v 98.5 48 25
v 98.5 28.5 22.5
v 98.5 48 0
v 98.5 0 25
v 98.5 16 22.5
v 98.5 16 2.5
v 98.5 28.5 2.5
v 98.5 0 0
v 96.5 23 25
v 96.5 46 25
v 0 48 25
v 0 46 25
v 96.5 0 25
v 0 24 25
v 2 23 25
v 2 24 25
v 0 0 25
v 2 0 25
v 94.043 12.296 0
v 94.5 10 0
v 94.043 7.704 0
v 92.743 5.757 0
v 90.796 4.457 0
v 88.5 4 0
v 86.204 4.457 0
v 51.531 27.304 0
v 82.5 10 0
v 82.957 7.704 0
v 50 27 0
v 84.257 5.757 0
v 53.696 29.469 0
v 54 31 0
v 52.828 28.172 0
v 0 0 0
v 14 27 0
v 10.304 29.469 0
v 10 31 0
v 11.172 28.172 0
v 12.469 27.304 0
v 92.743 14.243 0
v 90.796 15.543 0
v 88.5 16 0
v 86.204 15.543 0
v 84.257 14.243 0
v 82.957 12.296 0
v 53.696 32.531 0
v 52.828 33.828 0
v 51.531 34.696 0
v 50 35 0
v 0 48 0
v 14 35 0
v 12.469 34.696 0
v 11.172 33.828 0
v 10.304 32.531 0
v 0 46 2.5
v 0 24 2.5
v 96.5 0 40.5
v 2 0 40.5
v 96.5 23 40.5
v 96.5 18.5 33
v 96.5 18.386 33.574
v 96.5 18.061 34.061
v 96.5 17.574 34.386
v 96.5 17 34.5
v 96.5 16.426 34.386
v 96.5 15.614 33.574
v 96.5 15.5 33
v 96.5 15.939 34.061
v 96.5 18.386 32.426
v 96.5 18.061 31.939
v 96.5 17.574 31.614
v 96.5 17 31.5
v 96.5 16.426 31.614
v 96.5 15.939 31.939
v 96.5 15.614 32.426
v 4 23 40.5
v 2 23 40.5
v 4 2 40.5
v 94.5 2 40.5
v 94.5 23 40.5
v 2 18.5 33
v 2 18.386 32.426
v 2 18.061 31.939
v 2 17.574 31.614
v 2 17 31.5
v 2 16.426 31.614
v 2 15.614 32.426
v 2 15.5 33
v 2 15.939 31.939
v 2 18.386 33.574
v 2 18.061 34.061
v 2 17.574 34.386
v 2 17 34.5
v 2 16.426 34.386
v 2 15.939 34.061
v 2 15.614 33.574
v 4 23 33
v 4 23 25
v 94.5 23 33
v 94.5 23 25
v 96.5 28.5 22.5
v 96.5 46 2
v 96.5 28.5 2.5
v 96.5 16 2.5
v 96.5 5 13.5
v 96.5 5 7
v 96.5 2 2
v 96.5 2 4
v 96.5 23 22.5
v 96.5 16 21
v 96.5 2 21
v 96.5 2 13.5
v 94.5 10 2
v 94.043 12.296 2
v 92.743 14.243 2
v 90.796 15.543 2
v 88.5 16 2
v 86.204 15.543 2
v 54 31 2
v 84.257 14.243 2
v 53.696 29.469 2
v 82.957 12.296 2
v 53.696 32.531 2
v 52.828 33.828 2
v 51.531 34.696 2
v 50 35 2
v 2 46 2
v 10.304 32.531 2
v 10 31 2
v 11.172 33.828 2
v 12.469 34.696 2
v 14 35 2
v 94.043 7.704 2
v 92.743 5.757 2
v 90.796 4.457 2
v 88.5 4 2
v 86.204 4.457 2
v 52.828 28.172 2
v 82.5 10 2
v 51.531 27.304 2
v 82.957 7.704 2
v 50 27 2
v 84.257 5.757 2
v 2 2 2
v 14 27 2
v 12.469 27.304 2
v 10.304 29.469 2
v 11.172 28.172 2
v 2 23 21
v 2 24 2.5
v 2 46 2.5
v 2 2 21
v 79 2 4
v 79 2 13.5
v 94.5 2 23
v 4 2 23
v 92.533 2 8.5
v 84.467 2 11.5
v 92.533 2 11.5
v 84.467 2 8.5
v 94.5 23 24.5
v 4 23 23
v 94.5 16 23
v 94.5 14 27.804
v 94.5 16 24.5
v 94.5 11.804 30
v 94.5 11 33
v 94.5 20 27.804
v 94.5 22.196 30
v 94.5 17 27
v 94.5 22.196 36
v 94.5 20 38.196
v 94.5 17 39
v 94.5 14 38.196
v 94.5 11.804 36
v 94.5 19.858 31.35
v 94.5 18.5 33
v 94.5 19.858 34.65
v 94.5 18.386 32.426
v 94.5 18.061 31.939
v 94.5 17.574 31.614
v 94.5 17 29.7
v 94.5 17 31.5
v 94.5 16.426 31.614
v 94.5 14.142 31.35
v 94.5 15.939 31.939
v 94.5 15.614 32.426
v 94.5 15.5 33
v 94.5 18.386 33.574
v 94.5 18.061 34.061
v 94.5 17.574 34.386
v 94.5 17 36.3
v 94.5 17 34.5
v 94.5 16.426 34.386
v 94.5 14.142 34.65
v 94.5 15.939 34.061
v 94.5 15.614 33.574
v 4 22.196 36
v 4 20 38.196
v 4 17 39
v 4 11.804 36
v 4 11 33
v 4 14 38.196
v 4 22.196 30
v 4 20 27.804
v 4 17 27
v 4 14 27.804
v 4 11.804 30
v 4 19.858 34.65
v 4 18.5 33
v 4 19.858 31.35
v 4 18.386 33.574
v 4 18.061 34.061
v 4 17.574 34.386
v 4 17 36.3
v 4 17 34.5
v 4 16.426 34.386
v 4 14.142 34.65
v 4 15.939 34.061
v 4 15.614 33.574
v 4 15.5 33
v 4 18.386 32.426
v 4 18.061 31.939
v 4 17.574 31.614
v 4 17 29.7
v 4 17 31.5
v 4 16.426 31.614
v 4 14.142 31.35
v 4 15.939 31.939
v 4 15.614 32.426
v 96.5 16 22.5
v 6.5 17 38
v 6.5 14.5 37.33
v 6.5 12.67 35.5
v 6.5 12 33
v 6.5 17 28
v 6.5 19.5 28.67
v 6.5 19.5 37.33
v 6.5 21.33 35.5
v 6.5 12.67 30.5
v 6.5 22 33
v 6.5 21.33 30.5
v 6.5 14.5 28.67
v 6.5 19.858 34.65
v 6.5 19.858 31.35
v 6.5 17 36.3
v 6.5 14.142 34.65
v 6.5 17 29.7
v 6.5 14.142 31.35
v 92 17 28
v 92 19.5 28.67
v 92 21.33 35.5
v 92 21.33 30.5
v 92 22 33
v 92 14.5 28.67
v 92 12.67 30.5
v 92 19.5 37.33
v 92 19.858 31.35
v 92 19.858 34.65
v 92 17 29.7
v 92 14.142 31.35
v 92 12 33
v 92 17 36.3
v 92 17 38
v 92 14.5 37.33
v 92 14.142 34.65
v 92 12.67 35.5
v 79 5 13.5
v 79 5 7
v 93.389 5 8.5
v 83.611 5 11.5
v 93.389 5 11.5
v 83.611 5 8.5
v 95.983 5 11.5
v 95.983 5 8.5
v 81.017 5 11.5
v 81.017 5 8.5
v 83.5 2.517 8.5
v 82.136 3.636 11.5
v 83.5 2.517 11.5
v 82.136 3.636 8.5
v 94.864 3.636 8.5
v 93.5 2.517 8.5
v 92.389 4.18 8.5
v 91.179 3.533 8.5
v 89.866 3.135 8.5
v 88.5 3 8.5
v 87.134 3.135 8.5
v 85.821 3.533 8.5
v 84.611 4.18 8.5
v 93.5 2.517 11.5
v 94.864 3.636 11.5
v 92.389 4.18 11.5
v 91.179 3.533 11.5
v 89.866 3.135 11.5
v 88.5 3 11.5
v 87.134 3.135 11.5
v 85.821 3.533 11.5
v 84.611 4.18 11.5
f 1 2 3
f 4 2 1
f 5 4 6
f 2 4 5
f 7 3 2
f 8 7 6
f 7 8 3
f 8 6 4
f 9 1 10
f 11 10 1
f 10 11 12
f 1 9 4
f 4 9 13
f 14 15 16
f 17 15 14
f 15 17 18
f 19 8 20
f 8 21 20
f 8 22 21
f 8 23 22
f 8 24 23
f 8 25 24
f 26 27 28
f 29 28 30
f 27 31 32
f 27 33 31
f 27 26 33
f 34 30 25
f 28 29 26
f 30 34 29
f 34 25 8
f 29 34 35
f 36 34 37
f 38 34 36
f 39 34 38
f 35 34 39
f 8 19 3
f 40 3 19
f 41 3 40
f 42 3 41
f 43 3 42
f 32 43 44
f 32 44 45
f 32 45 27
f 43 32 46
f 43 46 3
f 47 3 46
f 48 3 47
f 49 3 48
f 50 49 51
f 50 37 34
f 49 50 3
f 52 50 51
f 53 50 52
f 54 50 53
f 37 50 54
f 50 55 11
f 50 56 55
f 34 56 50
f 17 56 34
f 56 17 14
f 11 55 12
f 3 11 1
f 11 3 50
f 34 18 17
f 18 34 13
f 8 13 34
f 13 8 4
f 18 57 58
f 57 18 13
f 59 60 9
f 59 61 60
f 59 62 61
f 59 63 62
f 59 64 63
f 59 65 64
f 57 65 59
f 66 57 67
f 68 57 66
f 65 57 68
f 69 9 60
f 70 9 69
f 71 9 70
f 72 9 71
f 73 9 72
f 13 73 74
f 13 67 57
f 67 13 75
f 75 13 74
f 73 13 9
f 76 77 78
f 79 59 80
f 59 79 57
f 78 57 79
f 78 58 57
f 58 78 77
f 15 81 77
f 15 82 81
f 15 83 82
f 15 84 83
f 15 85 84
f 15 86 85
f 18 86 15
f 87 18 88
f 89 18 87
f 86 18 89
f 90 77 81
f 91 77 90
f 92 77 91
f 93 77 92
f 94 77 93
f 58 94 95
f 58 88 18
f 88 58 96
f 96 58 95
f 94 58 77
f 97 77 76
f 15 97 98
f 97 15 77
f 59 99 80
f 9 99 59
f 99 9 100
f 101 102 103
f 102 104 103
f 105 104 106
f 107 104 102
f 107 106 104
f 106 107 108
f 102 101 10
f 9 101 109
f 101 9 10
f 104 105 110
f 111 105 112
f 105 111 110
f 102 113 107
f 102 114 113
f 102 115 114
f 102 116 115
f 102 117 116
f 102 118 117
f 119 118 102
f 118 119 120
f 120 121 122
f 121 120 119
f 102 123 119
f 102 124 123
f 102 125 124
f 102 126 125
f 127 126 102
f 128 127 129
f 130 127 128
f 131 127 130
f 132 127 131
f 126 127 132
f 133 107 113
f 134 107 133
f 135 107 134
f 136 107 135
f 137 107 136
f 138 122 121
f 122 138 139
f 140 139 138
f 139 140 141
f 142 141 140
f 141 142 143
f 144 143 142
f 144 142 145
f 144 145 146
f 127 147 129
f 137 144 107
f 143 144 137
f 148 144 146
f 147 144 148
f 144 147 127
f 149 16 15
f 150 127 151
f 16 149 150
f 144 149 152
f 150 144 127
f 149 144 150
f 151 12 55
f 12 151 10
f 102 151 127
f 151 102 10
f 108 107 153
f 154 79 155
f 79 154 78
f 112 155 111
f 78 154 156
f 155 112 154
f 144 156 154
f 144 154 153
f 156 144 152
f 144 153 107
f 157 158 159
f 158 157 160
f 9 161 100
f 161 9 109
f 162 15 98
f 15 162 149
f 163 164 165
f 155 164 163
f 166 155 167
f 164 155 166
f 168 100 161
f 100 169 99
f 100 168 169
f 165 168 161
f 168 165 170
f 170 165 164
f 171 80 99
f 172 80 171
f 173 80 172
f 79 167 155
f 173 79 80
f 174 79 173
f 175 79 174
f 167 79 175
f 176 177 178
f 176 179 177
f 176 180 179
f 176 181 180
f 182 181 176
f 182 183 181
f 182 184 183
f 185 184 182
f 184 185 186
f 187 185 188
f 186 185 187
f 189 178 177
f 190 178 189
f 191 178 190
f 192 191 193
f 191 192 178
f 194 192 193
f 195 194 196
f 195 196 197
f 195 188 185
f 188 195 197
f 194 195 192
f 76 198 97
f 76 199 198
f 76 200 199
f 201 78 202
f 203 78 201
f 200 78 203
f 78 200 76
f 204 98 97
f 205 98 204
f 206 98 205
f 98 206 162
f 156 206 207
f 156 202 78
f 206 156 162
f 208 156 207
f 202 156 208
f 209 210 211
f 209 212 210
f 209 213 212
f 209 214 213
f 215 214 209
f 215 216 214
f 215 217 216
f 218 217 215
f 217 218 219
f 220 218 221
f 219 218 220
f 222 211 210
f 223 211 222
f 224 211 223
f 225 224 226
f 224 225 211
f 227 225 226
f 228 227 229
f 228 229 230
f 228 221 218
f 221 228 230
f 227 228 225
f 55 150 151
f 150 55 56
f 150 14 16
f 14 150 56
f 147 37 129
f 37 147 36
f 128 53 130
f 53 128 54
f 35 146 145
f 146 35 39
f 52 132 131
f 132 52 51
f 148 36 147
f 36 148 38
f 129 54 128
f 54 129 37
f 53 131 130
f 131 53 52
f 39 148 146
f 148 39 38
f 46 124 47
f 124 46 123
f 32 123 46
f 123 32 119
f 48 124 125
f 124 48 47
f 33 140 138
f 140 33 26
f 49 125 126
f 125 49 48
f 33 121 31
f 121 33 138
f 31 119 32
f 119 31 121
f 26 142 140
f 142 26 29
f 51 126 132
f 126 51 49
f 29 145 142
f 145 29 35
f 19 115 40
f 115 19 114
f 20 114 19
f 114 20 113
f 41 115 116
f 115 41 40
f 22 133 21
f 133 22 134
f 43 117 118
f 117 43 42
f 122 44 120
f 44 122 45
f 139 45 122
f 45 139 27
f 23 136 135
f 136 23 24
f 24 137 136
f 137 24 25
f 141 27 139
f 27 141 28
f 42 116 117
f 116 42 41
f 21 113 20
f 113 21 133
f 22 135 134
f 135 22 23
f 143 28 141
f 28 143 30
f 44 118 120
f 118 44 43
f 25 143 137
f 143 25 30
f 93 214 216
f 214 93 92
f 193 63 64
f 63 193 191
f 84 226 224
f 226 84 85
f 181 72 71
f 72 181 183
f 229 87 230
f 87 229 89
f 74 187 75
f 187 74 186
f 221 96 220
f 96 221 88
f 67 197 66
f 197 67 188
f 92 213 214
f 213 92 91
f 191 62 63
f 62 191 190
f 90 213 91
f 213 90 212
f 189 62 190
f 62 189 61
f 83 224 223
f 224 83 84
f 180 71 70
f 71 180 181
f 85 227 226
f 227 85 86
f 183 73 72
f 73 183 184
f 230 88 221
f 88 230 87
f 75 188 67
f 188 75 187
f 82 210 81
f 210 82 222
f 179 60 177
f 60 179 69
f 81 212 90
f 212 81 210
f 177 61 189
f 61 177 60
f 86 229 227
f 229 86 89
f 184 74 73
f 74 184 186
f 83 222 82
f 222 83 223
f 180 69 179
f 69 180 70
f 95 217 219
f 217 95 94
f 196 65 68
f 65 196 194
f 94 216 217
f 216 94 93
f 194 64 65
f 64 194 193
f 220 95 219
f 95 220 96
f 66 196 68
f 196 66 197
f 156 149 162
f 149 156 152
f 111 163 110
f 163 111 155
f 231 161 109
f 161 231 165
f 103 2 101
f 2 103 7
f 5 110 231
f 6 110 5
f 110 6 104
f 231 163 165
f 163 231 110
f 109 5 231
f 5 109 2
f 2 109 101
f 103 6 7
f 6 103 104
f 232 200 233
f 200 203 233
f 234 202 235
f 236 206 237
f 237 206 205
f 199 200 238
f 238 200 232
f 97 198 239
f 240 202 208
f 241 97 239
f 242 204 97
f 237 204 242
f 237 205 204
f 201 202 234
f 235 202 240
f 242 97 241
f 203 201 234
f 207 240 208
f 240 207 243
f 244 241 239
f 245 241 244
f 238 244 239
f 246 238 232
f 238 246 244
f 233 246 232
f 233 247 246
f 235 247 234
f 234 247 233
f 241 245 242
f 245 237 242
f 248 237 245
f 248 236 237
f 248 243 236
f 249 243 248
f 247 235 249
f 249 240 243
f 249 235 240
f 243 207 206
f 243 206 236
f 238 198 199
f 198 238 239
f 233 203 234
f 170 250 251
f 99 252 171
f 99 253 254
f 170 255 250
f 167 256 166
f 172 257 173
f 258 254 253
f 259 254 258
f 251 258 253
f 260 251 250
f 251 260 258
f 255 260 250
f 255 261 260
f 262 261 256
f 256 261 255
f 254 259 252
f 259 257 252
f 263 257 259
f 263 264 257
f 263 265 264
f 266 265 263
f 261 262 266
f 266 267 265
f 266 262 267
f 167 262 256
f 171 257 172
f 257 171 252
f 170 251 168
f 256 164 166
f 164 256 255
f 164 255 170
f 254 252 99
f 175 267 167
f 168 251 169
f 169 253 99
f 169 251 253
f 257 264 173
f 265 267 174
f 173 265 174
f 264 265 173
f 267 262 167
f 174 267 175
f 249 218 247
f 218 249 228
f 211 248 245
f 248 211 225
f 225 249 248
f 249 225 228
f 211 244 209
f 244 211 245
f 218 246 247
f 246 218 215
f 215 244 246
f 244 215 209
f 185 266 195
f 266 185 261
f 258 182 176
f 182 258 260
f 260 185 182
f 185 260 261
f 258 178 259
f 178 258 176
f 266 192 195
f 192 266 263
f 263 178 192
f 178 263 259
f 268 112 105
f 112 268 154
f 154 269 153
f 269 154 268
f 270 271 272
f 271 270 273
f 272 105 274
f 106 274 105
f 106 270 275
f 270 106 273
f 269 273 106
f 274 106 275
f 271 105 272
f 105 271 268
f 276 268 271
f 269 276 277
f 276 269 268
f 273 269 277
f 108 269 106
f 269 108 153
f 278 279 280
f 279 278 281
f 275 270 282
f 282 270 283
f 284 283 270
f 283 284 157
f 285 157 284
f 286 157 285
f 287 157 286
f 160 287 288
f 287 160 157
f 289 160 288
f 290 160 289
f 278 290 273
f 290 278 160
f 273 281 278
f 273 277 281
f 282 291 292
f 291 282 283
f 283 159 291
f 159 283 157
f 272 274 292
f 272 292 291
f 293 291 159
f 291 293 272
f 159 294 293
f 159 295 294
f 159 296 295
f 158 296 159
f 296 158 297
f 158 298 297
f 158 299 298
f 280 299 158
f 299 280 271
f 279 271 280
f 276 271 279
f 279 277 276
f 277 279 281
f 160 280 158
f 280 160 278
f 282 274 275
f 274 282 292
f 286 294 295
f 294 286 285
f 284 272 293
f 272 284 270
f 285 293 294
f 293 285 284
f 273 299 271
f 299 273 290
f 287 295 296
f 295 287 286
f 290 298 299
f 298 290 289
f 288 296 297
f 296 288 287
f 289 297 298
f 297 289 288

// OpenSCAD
sirka = 98.5;
vyska = 25;
hloubka = 48;
tloustka_steny = 2;
plech_tloustka = 2;

pruchodka = 12;

module power_base(){
    cube([sirka,hloubka,vyska]);
    translate([0+plech_tloustka,0,vyska]) cube([sirka-2*plech_tloustka,23,15.5]);
}

module power_cuts(){
    translate([tloustka_steny,tloustka_steny,tloustka_steny]) cube([sirka-2*tloustka_steny,hloubka-2*tloustka_steny,vyska-3*tloustka_steny]);
    translate([tloustka_steny,23,vyska-2*tloustka_steny]) cube([sirka-2*tloustka_steny,hloubka-23-tloustka_steny,2*tloustka_steny]);
    translate([2*tloustka_steny,tloustka_steny,vyska-2*tloustka_steny]) cube([sirka-4*tloustka_steny,hloubka-23-tloustka_steny,16+2*tloustka_steny]);

    // otvor naboku
    translate([0,24,vyska-22.5]) cube([tloustka_steny,hloubka-24-tloustka_steny,22.5]);

    translate([14,31,0]) cylinder(r=4,h=vyska,$fn=16,center=true);
    translate([50,31,0]) cylinder(r=4,h=vyska,$fn=16,center=true);
    translate([14,31-4,0]) cube([36,4*2,vyska]);

    // otvor pre priechodku
    translate([sirka-tloustka_steny-2-pruchodka/2,tloustka_steny+2+pruchodka/2,0]) cylinder(r=pruchodka/2,h=vyska,$fn=16,center=true);

    // otvory pre sroby
    translate([sirka/2,17,vyska+8]) rotate([0,90,0])cylinder(r=3/2,h=sirka,$fn=16,center=true);    
  
    translate([tloustka_steny,tloustka_steny,vyska-2*tloustka_steny]) rotate([0,45,0])cube([sqrt(tloustka_steny*tloustka_steny),23-tloustka_steny,sqrt(2*tloustka_steny*tloustka_steny)]);
    translate([sirka-3*tloustka_steny,tloustka_steny,vyska-2*tloustka_steny]) rotate([0,45,0])cube([sqrt(2*tloustka_steny*tloustka_steny),23-tloustka_steny,sqrt(2*tloustka_steny*tloustka_steny)]);

    translate([sirka-3*tloustka_steny,16,vyska-2.5]) rotate([0,45,0])cube([sqrt(2*tloustka_steny*tloustka_steny),12.5,sqrt(2*tloustka_steny*tloustka_steny)]);

    //otvor pre vypinac
    translate([sirka-2*tloustka_steny,16,(vyska-20)/2]) cube([2*tloustka_steny,12.5,20]);
}

module drzak_matky_base()
{
    translate([2*tloustka_steny+2.5/2,17,vyska+8]) rotate([0,90,0]) cylinder(r1=12/2,r2=10/2,h=2.5,$fn=12,center=true);

    translate([sirka-(2*tloustka_steny+2.5/2),17,vyska+8]) rotate([0,90,0]) cylinder(r1=10/2,r2=12/2,h=2.5,$fn=12,center=true);
}

module drzak_matky_cuts()
{
    translate([2*tloustka_steny+2.5/2+1,17,vyska+8]) rotate([0,90,0]) cylinder(r=6.6/2,h=5,$fn=6,center=true);
    translate([sirka-(2*tloustka_steny+2.5/2+1),17,vyska+8]) rotate([0,90,0]) cylinder(r=6.6/2,h=5,$fn=6,center=true);
}

module drzak_kabelu_base()
{
    difference(){
        translate([sirka-tloustka_steny-17.5,tloustka_steny/2,tloustka_steny+2]) cube([18,4,9.5]);
        translate([sirka,2,4]) rotate([0,45,90])cube([sqrt(2*4*4),23-tloustka_steny,sqrt(2*4*4)]);
    }
}

module drzak_kabelu_cuts()
{
    translate([sirka-tloustka_steny-2-pruchodka/2,9+tloustka_steny/2,tloustka_steny+2+6]) difference(){
    rotate([0,0,0]) cylinder(r=9,h=3,$fn=32,center=true);
      rotate([0,0,0]) cylinder(r=7,h=4,$fn=32,center=true);
  }
}

module drzak_matky(){
    difference(){
        drzak_matky_base();
        drzak_matky_cuts();
    }
}

module drzak_kabelu(){
    difference(){
        drzak_kabelu_base();
        drzak_kabelu_cuts();
    }
}

module kryt_zdroje(){
	difference(){
	  power_base();
	  power_cuts();
	}
}

module kryt(){
    kryt_zdroje();
    drzak_matky();
    drzak_kabelu();
}

kryt();
